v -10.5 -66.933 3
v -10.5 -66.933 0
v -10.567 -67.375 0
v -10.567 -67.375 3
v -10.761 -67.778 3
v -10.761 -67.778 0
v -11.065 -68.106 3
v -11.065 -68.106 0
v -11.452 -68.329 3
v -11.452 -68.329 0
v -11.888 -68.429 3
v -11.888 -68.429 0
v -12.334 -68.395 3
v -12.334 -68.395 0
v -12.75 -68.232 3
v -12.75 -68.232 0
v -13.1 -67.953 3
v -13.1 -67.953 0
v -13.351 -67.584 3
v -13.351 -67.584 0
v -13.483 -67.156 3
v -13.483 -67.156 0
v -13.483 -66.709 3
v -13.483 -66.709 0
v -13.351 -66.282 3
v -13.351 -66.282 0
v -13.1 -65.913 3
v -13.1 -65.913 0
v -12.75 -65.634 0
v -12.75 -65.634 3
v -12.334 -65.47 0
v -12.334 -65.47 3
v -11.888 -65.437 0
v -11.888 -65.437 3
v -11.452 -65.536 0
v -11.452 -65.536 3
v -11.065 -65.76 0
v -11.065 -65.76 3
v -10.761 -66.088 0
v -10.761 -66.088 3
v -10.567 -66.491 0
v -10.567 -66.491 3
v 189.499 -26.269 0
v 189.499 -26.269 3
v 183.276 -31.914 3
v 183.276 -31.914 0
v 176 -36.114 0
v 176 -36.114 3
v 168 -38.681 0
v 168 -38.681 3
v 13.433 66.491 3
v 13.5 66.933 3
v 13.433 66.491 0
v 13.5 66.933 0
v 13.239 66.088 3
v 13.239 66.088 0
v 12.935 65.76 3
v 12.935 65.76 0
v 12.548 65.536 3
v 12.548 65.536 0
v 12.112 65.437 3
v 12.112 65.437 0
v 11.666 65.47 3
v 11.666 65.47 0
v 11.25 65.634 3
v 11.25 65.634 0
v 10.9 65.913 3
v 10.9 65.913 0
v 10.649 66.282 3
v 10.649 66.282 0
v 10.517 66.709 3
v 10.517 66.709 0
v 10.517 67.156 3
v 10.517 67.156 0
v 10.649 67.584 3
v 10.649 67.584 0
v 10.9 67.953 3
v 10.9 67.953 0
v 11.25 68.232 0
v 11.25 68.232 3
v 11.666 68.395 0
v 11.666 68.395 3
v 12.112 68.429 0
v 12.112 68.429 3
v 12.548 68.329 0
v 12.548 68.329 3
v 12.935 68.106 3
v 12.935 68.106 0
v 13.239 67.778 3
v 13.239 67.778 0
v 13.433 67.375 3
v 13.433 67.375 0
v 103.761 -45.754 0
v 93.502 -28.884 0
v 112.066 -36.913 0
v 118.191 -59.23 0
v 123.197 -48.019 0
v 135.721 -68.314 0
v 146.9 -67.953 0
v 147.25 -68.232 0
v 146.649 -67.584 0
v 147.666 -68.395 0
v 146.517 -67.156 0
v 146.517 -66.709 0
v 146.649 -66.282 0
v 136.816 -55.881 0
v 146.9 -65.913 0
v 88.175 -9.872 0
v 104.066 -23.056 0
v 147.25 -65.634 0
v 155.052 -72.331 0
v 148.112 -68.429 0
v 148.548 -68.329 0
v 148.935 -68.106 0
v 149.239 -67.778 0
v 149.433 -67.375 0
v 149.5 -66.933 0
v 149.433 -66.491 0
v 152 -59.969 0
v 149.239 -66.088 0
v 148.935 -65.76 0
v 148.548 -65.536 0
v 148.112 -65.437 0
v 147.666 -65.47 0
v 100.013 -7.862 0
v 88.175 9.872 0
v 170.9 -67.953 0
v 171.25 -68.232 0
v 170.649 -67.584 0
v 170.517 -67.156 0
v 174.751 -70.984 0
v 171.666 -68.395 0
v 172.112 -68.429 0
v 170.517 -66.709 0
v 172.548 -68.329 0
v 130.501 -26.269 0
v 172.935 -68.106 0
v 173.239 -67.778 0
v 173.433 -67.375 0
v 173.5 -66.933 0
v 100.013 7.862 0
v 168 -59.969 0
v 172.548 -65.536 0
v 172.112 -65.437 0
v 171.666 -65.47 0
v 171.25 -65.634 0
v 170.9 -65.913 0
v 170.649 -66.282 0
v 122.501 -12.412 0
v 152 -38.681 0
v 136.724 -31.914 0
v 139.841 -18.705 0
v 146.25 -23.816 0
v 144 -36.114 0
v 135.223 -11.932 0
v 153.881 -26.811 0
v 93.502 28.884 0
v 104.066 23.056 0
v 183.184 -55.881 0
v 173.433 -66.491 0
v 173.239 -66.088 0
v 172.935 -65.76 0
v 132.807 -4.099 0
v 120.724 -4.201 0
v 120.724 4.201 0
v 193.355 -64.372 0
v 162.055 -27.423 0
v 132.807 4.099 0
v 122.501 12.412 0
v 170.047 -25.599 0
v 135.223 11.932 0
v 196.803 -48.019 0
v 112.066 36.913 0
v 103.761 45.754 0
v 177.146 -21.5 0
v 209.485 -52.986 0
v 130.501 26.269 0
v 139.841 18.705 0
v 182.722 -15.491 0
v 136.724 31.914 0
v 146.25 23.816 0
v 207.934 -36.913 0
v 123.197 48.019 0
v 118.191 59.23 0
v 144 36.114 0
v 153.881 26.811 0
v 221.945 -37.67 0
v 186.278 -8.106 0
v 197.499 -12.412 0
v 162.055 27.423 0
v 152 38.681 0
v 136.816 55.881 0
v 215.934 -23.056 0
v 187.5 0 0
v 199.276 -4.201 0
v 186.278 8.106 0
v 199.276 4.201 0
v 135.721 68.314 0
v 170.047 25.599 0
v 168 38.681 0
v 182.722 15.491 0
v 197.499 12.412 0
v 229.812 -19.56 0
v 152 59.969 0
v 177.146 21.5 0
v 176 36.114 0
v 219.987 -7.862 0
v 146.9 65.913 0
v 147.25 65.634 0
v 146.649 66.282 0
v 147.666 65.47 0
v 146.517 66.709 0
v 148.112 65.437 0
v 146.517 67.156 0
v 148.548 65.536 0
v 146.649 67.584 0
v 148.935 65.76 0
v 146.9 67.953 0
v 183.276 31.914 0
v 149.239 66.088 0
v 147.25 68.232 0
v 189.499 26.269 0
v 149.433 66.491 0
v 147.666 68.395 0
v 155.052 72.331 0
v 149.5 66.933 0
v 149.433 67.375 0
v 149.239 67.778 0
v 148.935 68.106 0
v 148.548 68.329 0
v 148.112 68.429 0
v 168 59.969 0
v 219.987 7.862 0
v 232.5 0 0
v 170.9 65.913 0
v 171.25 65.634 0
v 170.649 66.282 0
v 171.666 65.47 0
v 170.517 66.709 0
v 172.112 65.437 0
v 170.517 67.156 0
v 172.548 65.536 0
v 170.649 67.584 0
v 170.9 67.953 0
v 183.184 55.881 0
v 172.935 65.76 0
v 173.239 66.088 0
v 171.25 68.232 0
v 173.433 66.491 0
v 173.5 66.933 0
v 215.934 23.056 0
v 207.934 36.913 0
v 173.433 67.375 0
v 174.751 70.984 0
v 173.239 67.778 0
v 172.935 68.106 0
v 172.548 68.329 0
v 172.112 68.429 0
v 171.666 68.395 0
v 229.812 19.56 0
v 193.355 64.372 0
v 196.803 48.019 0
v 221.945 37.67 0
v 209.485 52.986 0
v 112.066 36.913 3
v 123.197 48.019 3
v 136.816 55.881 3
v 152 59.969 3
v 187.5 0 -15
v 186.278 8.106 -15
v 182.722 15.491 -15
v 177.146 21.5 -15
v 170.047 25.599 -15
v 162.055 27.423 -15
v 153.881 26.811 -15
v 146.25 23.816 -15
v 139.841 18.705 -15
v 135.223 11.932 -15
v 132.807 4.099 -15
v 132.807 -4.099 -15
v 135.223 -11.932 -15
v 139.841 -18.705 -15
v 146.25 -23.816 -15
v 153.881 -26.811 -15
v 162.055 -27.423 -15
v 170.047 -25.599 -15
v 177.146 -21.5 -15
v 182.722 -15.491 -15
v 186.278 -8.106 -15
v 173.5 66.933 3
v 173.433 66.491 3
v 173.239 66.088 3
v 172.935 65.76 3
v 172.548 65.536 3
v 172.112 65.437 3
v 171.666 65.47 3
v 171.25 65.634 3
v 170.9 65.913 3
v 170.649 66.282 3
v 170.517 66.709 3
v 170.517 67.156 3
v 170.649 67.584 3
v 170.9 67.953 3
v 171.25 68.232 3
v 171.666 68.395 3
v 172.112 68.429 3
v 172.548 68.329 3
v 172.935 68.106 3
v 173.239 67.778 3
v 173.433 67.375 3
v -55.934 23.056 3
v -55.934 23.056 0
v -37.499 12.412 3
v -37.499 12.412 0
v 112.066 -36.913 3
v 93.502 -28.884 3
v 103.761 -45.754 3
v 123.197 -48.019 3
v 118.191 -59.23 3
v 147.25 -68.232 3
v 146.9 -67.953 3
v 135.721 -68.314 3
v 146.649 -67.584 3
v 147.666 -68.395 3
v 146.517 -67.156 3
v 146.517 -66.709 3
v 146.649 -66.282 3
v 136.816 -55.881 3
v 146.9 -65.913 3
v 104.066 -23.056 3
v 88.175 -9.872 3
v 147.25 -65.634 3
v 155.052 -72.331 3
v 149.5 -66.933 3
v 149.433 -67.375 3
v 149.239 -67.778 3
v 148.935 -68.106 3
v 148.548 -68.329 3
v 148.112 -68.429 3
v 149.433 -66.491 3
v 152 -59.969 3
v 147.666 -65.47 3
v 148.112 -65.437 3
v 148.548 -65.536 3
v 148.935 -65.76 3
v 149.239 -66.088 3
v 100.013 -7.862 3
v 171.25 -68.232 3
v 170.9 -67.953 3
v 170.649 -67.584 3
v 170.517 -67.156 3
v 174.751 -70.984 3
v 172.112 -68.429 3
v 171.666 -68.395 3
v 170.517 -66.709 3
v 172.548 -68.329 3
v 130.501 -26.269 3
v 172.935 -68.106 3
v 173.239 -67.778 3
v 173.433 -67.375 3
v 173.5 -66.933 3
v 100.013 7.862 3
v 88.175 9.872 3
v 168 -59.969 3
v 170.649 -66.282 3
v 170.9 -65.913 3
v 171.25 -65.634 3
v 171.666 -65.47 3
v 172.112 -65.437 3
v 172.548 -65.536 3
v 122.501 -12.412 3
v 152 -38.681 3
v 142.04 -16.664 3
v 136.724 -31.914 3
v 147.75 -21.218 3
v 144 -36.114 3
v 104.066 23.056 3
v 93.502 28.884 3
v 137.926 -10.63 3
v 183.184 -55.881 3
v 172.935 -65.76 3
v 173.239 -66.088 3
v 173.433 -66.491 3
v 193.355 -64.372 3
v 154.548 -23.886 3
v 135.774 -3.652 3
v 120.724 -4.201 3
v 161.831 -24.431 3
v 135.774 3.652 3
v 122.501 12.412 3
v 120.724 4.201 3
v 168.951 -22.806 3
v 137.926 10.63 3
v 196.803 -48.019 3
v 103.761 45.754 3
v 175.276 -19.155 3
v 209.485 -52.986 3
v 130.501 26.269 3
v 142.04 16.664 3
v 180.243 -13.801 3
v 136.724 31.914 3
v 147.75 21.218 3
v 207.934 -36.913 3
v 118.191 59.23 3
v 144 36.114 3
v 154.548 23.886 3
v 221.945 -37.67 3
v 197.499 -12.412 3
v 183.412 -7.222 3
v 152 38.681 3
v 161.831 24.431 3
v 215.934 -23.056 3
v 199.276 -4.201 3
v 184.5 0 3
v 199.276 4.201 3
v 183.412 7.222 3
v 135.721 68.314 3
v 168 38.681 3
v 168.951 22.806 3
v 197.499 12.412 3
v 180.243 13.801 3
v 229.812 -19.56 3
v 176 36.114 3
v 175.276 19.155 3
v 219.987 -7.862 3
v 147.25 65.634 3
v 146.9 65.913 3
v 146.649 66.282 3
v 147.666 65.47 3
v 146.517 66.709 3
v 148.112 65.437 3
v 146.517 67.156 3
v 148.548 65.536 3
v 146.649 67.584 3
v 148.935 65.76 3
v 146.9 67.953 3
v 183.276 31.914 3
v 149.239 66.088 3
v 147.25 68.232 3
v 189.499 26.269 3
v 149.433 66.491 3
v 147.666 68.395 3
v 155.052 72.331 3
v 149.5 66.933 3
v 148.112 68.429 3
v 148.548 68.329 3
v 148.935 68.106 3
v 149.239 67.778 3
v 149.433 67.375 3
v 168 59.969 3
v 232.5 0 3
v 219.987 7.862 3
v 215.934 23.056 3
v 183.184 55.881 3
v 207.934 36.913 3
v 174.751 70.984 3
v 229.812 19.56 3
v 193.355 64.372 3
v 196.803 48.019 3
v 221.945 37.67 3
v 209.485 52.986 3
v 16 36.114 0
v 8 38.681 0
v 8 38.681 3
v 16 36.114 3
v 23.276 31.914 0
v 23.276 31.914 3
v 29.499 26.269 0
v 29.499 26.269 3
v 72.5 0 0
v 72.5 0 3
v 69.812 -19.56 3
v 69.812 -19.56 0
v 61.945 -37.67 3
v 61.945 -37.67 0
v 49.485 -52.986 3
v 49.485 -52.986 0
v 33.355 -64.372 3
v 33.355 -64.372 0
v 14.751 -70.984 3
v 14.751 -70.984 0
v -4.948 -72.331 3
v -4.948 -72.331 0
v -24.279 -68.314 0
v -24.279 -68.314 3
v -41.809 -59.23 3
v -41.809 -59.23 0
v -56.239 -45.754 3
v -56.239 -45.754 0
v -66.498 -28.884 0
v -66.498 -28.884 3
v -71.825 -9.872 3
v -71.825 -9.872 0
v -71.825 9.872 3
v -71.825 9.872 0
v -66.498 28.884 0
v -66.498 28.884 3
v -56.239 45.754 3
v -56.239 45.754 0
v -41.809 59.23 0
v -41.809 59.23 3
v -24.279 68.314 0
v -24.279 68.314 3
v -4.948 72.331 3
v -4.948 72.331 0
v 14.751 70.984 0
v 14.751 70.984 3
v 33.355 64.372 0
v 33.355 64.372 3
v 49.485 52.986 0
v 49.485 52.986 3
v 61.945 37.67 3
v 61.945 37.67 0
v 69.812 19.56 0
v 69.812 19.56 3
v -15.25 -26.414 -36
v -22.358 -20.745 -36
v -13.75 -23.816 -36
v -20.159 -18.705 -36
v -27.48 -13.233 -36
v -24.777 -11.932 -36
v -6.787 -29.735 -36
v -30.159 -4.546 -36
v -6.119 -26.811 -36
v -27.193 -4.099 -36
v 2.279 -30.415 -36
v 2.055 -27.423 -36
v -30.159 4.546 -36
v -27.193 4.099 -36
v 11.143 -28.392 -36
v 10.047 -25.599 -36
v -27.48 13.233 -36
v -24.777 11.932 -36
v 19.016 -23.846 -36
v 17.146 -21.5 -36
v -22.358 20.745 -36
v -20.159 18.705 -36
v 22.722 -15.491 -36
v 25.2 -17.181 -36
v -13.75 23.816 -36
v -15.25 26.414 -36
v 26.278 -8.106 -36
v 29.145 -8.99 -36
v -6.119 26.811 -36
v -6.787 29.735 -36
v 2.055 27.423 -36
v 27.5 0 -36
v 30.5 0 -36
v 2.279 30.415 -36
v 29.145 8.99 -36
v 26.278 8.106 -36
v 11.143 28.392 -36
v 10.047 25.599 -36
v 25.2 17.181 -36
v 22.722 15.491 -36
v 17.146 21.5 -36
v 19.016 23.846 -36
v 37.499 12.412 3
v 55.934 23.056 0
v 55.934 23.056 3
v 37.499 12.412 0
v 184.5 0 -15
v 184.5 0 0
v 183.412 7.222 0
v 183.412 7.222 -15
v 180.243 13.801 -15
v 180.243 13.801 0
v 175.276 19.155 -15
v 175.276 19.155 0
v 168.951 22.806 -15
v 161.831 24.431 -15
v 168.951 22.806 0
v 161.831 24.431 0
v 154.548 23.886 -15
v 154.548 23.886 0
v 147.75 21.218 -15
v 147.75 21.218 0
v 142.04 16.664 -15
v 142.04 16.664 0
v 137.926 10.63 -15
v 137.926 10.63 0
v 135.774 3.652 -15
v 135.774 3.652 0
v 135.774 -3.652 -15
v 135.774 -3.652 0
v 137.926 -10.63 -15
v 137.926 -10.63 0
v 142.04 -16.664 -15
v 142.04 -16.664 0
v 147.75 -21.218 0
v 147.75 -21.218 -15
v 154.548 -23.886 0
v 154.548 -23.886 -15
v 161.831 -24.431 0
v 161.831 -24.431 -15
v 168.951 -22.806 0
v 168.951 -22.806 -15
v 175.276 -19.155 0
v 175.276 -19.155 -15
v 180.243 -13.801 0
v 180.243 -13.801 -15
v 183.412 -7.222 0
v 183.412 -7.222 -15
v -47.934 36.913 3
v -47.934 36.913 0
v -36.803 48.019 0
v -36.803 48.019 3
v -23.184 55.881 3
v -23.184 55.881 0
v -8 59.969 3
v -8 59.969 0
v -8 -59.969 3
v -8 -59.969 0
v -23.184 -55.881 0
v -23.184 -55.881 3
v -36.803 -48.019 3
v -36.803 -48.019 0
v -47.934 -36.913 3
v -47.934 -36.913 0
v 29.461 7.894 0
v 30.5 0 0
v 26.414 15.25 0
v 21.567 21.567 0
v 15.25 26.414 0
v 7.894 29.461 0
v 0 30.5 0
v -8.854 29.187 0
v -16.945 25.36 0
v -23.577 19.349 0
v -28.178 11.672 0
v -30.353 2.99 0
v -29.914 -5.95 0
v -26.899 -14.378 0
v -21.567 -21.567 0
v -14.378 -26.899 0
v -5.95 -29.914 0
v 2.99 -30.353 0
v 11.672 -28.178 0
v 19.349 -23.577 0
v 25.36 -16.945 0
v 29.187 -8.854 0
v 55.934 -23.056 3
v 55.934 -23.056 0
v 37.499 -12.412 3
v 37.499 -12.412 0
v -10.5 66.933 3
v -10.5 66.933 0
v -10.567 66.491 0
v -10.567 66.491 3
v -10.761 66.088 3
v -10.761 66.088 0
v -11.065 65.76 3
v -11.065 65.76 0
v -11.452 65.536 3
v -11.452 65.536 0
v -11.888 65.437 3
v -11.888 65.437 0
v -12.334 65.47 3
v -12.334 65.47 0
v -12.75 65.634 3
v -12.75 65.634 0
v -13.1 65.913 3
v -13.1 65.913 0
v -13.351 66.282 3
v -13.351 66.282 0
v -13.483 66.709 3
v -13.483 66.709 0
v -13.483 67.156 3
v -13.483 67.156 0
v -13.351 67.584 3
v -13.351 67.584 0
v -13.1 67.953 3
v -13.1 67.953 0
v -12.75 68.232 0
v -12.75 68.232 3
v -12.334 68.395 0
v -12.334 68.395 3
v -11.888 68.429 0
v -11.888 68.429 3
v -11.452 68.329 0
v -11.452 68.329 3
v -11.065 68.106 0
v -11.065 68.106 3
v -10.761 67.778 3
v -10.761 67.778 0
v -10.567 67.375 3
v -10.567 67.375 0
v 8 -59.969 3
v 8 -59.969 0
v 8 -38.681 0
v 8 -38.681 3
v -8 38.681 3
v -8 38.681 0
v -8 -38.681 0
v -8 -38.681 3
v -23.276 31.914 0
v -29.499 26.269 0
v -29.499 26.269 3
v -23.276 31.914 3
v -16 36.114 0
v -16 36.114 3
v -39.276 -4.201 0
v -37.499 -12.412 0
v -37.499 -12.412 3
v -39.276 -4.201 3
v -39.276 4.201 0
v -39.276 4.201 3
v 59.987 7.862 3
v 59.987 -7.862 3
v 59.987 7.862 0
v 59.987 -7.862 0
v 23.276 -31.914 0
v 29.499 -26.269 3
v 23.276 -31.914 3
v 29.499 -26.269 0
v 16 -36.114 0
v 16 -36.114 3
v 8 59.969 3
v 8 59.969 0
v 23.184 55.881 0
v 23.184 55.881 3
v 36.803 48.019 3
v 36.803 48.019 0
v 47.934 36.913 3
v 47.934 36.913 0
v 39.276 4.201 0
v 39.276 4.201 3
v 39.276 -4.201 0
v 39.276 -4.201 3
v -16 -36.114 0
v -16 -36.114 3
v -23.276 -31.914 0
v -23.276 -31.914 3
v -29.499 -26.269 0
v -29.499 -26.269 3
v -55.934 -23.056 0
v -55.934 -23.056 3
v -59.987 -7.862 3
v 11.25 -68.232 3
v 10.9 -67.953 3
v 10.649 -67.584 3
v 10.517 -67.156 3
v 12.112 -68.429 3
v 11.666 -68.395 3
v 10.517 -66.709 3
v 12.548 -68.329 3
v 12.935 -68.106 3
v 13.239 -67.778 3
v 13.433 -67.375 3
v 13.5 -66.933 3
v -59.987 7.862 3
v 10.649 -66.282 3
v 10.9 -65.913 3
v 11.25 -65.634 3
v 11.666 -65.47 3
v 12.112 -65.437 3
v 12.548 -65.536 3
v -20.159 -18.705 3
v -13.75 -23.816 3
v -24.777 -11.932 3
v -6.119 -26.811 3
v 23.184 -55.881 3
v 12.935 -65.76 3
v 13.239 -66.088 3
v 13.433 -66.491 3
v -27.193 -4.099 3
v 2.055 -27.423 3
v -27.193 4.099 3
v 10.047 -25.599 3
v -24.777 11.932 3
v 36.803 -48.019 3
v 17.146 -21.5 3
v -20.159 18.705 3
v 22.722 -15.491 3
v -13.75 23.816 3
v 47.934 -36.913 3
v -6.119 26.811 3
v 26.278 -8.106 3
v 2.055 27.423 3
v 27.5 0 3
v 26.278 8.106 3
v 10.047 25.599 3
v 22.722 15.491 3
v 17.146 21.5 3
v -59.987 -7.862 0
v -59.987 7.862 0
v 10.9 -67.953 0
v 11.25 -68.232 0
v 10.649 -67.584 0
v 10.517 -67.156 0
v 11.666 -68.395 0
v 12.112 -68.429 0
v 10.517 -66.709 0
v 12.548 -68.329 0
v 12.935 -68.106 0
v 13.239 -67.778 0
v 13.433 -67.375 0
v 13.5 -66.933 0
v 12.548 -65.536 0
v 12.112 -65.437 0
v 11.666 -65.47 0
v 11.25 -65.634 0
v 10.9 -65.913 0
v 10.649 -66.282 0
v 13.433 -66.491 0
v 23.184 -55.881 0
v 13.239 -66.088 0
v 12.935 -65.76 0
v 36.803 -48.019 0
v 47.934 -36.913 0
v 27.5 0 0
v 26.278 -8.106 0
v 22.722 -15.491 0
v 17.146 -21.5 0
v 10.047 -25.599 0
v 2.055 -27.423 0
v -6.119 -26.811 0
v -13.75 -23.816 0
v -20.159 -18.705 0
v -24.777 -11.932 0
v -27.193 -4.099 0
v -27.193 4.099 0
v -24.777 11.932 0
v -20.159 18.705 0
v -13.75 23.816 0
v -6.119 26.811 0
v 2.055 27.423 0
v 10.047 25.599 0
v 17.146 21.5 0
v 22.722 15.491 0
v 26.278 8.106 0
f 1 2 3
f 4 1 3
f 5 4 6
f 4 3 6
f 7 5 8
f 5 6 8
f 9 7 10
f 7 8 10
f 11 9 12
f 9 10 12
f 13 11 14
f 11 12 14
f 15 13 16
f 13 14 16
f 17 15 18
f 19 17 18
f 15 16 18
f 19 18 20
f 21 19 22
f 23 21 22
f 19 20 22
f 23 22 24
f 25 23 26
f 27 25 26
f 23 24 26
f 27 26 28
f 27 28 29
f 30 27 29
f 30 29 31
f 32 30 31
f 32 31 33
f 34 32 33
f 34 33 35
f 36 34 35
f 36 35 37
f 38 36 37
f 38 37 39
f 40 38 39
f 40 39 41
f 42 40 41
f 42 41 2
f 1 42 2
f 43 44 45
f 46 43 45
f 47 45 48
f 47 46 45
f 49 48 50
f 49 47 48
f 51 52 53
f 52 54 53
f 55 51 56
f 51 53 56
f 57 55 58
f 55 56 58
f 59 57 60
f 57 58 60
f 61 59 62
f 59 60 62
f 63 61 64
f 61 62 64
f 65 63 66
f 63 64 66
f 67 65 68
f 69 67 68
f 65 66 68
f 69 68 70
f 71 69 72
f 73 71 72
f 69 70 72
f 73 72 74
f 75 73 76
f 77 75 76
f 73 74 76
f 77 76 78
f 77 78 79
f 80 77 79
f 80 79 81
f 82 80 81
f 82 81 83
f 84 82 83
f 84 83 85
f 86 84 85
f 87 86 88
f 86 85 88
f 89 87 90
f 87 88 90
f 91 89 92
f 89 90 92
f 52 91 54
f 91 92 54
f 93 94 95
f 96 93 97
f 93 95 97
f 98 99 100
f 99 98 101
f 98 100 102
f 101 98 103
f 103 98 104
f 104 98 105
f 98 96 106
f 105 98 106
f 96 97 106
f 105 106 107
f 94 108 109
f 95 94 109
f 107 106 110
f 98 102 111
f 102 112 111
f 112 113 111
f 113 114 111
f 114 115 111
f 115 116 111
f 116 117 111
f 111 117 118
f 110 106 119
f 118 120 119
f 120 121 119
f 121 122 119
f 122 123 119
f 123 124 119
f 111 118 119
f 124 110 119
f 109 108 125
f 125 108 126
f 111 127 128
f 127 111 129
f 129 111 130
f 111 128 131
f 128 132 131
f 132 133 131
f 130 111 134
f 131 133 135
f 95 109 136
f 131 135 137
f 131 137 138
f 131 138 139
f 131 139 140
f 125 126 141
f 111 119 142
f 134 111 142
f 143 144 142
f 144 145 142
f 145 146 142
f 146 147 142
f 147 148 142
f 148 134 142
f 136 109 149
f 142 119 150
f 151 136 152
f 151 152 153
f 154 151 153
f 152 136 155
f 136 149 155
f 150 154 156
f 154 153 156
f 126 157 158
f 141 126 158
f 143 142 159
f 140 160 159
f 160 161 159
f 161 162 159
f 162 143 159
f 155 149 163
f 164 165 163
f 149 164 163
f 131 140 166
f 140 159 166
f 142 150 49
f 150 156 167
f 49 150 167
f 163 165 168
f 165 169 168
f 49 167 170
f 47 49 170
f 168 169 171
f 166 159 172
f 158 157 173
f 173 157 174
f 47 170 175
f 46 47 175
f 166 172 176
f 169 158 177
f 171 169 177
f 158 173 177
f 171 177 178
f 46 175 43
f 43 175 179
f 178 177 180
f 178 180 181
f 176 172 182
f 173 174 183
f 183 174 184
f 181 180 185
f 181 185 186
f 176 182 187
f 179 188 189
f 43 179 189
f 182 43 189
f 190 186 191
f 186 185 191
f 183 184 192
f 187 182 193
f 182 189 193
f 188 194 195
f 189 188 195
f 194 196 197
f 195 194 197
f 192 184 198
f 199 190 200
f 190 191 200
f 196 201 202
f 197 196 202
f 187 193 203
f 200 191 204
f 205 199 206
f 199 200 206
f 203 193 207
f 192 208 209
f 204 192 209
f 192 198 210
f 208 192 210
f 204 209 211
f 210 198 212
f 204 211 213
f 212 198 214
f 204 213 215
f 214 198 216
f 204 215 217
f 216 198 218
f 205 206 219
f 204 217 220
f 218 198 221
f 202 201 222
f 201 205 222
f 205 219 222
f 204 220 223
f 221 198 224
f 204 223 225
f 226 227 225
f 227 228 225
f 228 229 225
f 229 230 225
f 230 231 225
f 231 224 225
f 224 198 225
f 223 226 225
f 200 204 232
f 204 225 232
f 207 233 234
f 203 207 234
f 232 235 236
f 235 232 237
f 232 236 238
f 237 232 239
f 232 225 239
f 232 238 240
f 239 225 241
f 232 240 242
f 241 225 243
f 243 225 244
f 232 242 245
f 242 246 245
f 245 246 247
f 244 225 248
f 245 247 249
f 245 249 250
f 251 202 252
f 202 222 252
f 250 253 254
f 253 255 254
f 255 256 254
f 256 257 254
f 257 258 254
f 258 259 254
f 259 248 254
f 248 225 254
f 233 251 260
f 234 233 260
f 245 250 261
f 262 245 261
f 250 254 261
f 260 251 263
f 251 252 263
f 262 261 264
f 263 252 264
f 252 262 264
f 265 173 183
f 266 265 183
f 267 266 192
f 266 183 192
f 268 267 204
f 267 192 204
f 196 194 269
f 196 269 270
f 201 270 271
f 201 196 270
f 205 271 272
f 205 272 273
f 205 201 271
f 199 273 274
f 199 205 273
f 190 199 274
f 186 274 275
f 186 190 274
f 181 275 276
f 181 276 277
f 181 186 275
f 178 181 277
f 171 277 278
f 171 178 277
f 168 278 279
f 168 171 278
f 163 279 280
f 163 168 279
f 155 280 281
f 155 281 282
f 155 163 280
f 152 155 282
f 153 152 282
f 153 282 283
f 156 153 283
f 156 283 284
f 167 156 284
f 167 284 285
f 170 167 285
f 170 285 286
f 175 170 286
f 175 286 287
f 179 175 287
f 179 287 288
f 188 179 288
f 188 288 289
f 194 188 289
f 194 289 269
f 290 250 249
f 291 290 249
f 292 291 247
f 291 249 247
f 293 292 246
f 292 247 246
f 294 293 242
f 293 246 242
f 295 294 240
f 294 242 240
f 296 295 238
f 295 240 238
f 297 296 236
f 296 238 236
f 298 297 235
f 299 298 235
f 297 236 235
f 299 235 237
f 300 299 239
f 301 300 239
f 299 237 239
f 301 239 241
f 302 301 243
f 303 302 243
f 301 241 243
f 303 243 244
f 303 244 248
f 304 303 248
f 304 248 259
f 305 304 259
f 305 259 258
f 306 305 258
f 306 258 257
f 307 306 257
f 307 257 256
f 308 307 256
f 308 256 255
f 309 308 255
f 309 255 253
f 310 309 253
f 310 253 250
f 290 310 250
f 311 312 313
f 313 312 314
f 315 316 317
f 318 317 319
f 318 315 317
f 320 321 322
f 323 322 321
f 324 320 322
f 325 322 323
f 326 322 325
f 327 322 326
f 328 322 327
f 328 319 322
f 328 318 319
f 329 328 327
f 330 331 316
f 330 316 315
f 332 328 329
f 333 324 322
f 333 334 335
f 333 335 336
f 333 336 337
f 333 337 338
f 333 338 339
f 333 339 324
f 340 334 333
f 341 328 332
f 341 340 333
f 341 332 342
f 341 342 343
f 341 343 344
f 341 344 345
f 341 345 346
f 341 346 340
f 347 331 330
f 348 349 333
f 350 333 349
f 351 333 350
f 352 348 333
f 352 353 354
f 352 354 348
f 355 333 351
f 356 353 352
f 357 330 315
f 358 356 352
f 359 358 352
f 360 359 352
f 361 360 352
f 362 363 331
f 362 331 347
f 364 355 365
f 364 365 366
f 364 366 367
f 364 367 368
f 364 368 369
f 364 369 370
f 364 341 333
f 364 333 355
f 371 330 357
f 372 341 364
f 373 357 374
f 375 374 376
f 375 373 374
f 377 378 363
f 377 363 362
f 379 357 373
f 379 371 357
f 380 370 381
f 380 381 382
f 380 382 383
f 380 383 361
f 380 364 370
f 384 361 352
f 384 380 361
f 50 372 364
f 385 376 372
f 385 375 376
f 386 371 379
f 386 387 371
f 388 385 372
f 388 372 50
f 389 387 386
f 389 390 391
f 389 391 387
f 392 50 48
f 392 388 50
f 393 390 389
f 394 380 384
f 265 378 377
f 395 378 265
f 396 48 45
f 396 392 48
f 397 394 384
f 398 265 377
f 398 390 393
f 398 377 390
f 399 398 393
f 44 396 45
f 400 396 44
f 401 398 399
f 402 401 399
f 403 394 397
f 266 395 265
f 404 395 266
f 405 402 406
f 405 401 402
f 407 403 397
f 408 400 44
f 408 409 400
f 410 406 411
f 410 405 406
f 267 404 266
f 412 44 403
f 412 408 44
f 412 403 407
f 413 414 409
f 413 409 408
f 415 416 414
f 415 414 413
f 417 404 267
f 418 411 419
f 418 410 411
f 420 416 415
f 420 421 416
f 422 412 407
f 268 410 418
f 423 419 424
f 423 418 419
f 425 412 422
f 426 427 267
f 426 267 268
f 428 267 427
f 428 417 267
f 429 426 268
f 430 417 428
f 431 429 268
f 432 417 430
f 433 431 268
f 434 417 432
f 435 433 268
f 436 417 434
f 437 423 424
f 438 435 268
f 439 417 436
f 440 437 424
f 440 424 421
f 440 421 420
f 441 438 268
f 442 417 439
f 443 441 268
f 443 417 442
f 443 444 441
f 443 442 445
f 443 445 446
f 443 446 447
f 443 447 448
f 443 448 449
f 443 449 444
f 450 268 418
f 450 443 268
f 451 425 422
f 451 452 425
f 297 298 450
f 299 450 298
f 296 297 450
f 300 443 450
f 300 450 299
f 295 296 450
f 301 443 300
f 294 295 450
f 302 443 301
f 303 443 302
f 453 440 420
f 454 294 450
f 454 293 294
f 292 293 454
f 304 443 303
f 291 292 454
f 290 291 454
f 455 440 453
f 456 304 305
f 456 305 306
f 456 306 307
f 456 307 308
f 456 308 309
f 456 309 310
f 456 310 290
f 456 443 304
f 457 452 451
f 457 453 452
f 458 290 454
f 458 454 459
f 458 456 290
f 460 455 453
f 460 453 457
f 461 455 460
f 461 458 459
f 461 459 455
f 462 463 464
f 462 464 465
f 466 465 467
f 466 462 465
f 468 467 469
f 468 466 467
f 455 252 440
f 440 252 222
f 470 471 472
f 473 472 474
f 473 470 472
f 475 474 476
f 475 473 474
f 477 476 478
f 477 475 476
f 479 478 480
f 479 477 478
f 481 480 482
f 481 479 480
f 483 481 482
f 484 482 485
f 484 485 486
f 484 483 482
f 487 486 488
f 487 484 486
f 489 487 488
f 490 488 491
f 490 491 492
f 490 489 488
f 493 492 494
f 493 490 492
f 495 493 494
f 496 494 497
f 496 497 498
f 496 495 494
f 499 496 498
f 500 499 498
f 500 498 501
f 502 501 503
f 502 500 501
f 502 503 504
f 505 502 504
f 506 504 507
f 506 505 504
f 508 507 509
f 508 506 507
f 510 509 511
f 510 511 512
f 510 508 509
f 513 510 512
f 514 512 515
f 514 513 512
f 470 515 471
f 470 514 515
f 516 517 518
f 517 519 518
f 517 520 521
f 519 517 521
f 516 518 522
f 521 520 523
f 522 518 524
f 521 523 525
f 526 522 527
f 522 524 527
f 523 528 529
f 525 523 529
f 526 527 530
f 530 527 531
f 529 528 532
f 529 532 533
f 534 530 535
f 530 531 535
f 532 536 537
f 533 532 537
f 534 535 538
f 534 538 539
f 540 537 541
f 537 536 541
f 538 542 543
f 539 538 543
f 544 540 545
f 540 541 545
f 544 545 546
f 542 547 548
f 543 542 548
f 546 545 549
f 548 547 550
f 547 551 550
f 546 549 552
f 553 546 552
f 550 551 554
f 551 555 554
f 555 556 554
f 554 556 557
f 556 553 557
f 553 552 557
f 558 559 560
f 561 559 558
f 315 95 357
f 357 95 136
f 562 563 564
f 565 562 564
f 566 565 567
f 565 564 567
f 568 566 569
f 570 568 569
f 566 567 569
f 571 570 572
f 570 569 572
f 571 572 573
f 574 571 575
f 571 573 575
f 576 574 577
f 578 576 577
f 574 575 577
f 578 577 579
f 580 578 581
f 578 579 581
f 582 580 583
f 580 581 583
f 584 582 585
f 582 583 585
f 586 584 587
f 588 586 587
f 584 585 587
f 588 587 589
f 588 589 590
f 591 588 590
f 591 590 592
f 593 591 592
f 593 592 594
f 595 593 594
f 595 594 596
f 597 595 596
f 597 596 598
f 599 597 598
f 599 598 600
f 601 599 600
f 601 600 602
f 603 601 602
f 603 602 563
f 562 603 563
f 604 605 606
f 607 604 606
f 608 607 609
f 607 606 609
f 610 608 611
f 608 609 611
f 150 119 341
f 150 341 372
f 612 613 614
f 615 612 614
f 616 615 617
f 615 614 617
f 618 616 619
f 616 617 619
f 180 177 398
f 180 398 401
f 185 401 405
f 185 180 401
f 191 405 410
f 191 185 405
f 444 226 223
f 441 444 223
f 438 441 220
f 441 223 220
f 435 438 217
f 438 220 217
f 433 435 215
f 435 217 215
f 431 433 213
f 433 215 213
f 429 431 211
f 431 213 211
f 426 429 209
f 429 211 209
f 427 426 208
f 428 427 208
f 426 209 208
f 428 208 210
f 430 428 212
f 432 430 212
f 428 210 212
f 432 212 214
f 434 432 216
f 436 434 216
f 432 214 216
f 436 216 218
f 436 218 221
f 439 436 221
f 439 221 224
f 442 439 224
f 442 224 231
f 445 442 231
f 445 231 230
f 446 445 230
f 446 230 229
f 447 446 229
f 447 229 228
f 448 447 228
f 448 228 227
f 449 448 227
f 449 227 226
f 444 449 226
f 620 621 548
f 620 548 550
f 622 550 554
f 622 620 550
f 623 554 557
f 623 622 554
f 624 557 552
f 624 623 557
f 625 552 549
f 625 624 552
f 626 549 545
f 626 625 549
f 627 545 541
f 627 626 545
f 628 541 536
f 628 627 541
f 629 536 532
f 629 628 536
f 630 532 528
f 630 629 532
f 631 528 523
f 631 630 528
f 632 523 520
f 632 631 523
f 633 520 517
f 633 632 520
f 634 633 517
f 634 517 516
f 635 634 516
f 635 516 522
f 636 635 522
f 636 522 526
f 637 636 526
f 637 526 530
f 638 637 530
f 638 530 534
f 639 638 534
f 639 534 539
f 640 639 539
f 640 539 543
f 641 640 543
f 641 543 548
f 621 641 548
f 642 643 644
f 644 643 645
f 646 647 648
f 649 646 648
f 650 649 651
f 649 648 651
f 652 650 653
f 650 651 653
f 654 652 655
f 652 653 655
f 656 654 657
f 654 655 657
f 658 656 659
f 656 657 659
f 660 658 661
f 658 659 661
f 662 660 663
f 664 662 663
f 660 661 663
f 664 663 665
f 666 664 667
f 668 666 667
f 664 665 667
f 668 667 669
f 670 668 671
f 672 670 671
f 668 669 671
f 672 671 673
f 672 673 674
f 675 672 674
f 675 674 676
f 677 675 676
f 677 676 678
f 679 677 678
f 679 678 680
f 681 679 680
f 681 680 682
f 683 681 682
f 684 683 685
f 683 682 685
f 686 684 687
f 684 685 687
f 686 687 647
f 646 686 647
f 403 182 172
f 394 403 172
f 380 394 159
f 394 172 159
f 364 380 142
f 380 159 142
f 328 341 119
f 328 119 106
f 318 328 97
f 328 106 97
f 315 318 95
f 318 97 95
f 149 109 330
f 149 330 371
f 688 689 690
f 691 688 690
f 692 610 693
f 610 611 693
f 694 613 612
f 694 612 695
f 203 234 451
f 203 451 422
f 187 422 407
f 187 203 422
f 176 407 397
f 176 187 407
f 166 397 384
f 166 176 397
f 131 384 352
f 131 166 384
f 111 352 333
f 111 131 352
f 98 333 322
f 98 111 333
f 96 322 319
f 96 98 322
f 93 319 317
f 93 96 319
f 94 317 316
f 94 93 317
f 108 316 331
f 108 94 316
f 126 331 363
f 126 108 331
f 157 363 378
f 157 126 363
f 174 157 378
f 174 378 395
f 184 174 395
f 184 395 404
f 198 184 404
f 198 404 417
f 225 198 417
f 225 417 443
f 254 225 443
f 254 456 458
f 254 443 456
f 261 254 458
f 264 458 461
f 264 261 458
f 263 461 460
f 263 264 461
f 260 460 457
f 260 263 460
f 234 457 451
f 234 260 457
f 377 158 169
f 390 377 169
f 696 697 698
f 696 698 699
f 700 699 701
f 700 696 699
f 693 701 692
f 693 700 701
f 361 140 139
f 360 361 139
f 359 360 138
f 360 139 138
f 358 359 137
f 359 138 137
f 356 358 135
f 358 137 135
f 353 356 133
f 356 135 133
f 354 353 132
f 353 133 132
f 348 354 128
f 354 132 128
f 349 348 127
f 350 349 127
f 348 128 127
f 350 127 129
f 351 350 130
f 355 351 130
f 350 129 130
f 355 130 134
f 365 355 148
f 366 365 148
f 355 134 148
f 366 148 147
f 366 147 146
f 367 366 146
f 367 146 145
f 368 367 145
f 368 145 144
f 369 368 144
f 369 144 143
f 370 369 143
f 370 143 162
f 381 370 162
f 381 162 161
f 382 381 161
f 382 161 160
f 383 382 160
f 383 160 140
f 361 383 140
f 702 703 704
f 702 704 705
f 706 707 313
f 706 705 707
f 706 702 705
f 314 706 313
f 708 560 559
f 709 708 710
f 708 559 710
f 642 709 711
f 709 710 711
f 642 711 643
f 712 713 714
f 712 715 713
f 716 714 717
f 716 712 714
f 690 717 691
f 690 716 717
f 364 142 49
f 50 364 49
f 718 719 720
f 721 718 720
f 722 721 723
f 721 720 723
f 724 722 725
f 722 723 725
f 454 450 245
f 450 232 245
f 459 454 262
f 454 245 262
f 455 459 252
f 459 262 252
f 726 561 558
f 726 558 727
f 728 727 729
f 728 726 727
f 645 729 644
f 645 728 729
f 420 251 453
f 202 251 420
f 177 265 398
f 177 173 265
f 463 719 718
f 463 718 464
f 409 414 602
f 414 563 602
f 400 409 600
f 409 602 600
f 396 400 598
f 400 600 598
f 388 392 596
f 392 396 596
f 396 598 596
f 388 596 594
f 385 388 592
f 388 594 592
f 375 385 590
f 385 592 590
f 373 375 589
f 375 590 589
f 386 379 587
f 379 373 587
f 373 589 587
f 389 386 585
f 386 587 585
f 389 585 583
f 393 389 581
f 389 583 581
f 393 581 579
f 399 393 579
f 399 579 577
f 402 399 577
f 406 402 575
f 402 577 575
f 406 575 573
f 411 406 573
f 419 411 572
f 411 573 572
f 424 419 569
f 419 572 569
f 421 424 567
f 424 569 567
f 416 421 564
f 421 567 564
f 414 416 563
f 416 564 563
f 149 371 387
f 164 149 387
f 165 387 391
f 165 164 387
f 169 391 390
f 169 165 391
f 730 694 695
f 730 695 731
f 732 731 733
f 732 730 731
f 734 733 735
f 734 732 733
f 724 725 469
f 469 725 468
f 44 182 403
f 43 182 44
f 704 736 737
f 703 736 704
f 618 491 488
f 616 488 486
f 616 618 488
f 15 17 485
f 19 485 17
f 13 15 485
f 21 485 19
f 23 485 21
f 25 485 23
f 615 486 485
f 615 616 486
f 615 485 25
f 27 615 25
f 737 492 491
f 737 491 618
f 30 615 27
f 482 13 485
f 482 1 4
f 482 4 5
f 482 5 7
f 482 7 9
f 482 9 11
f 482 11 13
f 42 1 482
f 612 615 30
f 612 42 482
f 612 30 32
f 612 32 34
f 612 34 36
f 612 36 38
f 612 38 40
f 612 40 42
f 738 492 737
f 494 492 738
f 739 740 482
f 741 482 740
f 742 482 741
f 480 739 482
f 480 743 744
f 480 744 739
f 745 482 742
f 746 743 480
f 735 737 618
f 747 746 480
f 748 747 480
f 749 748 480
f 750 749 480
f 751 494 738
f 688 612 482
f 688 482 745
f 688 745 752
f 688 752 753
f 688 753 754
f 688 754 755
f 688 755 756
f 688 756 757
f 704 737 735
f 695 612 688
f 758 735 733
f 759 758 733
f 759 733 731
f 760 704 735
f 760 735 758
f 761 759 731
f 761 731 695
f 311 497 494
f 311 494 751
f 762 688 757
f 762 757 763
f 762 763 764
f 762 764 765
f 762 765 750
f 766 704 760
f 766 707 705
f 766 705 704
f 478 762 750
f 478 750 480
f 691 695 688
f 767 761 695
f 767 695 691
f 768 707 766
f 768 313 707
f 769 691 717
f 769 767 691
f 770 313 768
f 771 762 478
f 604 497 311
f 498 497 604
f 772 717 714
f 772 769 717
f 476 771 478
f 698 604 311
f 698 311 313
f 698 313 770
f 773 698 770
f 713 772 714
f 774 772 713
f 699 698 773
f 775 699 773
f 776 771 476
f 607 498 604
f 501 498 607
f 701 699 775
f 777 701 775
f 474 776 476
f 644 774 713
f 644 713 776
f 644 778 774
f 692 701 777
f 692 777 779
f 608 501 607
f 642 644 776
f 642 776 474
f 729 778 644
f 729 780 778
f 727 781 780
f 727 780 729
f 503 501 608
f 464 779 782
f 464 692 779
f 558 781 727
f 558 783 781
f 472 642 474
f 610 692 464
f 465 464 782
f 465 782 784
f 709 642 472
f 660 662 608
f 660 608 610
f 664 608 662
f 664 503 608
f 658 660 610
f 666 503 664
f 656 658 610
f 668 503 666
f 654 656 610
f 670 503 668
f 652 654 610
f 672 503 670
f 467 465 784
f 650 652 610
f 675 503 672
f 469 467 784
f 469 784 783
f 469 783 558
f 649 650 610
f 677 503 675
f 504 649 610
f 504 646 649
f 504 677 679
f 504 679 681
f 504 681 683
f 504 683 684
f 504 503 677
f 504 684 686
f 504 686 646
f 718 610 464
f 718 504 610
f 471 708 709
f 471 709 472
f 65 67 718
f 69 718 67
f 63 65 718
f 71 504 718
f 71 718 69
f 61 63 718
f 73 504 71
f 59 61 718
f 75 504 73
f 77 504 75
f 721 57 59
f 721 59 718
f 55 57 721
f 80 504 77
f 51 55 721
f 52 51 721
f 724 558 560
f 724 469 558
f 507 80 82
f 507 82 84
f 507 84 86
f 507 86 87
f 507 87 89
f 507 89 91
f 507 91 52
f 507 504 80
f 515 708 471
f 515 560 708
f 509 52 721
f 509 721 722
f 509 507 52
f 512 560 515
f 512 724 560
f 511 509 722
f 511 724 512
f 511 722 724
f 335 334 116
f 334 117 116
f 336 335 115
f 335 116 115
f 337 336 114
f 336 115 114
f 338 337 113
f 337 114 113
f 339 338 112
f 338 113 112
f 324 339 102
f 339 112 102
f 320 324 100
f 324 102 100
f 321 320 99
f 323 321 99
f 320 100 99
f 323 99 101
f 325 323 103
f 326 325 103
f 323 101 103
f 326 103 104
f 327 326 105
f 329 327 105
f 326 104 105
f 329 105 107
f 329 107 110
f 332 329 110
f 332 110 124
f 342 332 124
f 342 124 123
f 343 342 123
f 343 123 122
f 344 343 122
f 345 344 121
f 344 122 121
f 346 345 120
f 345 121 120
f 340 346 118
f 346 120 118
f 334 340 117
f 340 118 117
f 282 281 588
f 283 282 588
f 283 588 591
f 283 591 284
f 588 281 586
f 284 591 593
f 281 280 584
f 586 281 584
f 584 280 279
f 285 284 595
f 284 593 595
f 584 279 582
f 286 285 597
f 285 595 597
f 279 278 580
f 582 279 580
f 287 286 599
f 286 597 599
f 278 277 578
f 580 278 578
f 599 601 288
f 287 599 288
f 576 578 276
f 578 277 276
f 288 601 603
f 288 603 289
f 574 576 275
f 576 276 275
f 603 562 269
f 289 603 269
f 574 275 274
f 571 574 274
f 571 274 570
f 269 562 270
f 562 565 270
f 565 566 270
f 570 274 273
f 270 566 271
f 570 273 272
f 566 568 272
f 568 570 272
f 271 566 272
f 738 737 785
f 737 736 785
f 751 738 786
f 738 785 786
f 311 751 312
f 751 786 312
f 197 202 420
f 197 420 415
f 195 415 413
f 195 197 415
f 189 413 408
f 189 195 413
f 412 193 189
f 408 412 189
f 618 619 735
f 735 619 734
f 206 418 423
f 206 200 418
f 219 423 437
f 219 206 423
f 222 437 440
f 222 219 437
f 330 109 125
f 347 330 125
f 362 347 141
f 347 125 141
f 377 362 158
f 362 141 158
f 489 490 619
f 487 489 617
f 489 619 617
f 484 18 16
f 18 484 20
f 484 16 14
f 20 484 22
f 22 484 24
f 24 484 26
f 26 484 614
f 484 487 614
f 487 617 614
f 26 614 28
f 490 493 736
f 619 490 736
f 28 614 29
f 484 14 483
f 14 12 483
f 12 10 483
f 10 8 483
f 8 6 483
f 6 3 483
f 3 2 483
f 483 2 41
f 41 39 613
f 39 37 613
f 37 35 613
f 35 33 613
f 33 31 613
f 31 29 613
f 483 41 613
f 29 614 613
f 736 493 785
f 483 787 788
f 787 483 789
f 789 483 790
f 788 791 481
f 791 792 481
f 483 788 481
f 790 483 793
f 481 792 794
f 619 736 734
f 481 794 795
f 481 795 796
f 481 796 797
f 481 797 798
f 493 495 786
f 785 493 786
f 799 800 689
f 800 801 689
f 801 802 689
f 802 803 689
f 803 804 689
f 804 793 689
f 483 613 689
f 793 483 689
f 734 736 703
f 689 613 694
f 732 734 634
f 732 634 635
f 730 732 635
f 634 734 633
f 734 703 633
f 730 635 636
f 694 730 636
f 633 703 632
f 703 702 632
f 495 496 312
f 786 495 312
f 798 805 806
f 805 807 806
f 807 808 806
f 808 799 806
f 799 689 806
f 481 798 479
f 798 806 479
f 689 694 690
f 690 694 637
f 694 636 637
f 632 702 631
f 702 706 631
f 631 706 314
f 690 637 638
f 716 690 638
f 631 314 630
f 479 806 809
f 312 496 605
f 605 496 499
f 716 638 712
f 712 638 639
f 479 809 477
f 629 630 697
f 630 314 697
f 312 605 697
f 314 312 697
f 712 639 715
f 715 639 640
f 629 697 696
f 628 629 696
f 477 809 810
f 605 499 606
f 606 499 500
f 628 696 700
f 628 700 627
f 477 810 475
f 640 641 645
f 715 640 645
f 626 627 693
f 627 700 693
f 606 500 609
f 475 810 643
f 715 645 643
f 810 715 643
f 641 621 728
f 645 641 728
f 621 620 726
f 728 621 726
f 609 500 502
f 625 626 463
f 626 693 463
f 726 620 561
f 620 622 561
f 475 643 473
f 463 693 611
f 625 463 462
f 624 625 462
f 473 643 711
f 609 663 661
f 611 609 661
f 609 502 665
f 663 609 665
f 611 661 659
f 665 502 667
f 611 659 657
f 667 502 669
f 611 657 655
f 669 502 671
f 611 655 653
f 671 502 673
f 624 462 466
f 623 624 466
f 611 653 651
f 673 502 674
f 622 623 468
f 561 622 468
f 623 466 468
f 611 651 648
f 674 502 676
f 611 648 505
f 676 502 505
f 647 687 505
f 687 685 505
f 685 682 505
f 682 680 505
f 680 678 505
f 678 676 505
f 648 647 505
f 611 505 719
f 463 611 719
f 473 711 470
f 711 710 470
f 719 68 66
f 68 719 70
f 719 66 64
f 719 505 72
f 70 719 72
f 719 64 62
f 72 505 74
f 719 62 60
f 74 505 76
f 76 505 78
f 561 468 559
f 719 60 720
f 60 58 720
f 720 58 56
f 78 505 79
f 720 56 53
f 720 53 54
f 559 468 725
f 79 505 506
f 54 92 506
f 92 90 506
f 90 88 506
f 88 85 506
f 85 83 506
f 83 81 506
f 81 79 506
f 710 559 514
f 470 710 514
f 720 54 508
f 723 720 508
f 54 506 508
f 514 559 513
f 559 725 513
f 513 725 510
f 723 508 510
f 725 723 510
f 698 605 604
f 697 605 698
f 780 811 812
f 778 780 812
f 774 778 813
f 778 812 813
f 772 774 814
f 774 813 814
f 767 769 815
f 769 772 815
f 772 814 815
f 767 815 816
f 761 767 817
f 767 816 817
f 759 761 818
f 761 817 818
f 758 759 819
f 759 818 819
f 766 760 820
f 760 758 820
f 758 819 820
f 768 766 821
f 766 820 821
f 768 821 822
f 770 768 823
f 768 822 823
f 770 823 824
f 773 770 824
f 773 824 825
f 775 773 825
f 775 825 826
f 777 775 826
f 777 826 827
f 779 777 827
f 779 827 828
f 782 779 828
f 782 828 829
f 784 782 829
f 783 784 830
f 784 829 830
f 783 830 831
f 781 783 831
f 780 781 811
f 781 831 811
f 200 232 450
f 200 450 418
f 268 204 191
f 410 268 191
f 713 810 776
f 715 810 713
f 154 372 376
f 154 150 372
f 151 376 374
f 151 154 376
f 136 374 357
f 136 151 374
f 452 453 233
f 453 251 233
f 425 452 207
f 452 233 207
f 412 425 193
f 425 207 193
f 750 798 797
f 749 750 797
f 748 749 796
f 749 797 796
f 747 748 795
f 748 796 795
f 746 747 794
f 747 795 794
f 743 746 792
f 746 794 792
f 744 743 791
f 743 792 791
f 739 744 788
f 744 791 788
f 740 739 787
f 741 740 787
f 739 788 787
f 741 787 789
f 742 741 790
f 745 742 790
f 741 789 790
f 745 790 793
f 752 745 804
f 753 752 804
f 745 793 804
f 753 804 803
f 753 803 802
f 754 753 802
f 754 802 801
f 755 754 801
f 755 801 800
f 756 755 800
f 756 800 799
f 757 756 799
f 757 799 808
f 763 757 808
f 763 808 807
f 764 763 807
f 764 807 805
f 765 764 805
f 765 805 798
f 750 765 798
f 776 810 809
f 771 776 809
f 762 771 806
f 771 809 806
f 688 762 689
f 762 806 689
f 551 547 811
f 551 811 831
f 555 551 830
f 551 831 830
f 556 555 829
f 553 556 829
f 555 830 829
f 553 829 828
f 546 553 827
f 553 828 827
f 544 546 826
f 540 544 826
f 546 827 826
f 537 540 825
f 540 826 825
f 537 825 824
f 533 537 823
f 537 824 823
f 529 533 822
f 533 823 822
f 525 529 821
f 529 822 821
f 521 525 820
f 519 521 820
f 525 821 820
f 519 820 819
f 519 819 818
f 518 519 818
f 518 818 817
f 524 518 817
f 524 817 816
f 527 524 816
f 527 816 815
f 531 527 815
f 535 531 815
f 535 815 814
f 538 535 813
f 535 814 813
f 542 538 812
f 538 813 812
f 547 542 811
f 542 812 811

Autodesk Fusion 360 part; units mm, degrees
sketch "Sketch1" plane through (0, 0, 0) normal (0, 0, 1) x (1, 0, 0)
  circle A0 centre (0, 0) radius 72.5
  circle A1 centre (0, 0) radius 27.5
  circle A2 centre (0, 0) radius 30.5
  circle A3 centre (0, 0) radius 60.5
  circle A4 centre (0, 0) radius 39.5
  line L0 (0, 74) -> (0, 30.5)
  line L1 (8, 72.0573) -> (8, 38.6814)
  line L2 (-8, 72.0573) -> (-8, 38.6814)
  line L3 (-66.4034, 29.1004) -> (-37.4991, 12.4125)
  line L4 (-58.4034, 42.9568) -> (-29.4991, 26.2689)
  line L5 (-58.4034, -42.9568) -> (-29.4991, -26.2689)
  line L6 (-66.4034, -29.1004) -> (-37.4991, -12.4125)
  line L7 (8, -72.0573) -> (8, -38.6814)
  line L8 (-8, -72.0573) -> (-8, -38.6814)
  line L9 (66.4034, -29.1004) -> (37.4991, -12.4125)
  line L10 (58.4034, -42.9568) -> (29.4991, -26.2689)
  line L11 (58.4034, 42.9568) -> (29.4991, 26.2689)
  line L12 (66.4034, 29.1004) -> (37.4991, 12.4125)
  circle A5 centre (0, 0) radius 68
  circle A6 centre (-12, 66.9328) radius 1.5
  circle A7 centre (12, 66.9328) radius 1.5
  circle A8 centre (12, -66.9328) radius 1.5
  circle A9 centre (-12, -66.9328) radius 1.5
  dimension "d1" = 145
  dimension "d2" = 55
  dimension "d3" = 61
  dimension "d4" = 121
  dimension "d5" = 79
  dimension "d6" = 8
  dimension "d7" = 8
  dimension "d9" = 360
  dimension "d10" = 136
  dimension "d11" = 3
  dimension "d12" = 3
  dimension "d13" = 4
  dimension "d14" = 4
  dimension "d16" = 360
extrude "Extrude1" add sketch "Sketch1" along normal blind 3 contours A0 L9 L12 A5 | A0 L11 L12 A5 | A0 L9 L10 A5 | A0 L1 L11 A5 A7 | A3 L9 L12 A5 | A3 L11 L12 A5 | A0 L7 L10 A5 A8 | A3 L9 L10 A5 | A0 L0 L1 A5 | A3 L1 L11 A5 A7 | A3 A4 L11 L12 | A0 L7 L8 A5 | A3 L7 L10 A5 A8 | A3 A4 L9 L10 | A0 L0 L2 A5 | A3 L0 L1 A5 | A2 | A4 | A0 L5 L8 A5 A9 | A3 L7 L8 A5 | A0 L2 L4 A5 A6 | A3 L0 L2 A5 | A3 A4 L0 L1 | A0 L5 L6 A5 | A3 L5 L8 A5 A9 | A3 A4 L7 L8 | A0 L3 L4 A5 | A3 L2 L4 A5 A6 | A3 A4 L0 L2 | A0 L3 L6 A5 | A3 L5 L6 A5 | A3 L3 L4 A5 | A3 L3 L6 A5 | A3 A4 L5 L6 | A3 A4 L3 L4 makes body 1
extrude "Extrude2" add sketch "Sketch1" against normal blind 36 contours A2 bodies 1
sketch "Sketch2" plane through (0, 0, 0) normal (0, 0, 1) x (1, 0, 0)
  circle A0 centre (160, 0) radius 68
  circle A1 centre (160, 0) radius 72.5
  circle A2 centre (148, -66.9328) radius 1.5
  line L0 (168, -72.0573) -> (168, -38.6814)
  line L1 (226.4034, -29.1004) -> (197.4991, -12.4125)
  line L2 (168, 72.0573) -> (168, 38.6814)
  line L3 (101.5966, 42.9568) -> (130.5009, 26.2689)
  line L4 (101.5966, -42.9568) -> (130.5009, -26.2689)
  circle A3 centre (172, -66.9328) radius 1.5
  line L5 (93.5966, 29.1004) -> (122.5009, 12.4125)
  circle A4 centre (148, 66.9328) radius 1.5
  line L6 (218.4034, 42.9568) -> (189.4991, 26.2689)
  line L7 (93.5966, -29.1004) -> (122.5009, -12.4125)
  circle A5 centre (160, 0) radius 39.5
  line L8 (218.4034, -42.9568) -> (189.4991, -26.2689)
  circle A6 centre (172, 66.9328) radius 1.5
  circle A7 centre (160, 0) radius 30.5
  line L9 (152, -72.0573) -> (152, -38.6814)
  circle A8 centre (160, 0) radius 60.5
  line L10 (152, 72.0573) -> (152, 38.6814)
  circle A9 centre (160, 0) radius 27.5
  line L11 (226.4034, 29.1004) -> (197.4991, 12.4125)
  line L12 (160, 74) -> (160, 30.5)
  circle A10 centre (160, 0) radius 24.5
  point P0 (160, 0)
  dimension "d23" = 360
  dimension "d25" = 360
  dimension "d26" = 145
  dimension "d27" = 55
  dimension "d28" = 61
  dimension "d29" = 121
  dimension "d30" = 79
  dimension "d31" = 8
  dimension "d32" = 8
  dimension "d33" = 136
  dimension "d34" = 3
  dimension "d35" = 3
  dimension "d36" = 4
  dimension "d37" = 4
  dimension "d38" = 49
extrude "Extrude3" add sketch "Sketch2" along normal blind 3 separate body contours A0 L1 A8 L11 | A0 A1 L1 L11 | A0 L6 A8 L11 | A0 A1 L6 L11 | A0 A1 L1 L8 | A0 L1 L8 A8 | A0 L2 L6 A6 A8 | A0 A1 L2 L6 A6 | L6 A5 A8 L11 | A0 A1 L0 A3 L8 | A0 L0 A3 L8 A8 | L1 A5 L8 A8 | A7 | A5 | A0 A1 L2 L12 | A0 L2 A8 L12 | L2 A5 A8 L12 | A0 A1 L0 L9 | L0 A5 L9 A8 | A0 L0 L9 A8 | A0 A1 L10 L12 | A5 A8 L10 L12 | A0 A8 L10 L12 | A0 A1 A2 L4 L9 | A0 A2 L4 L9 A8 | A0 A1 L3 A4 L10 | A0 L3 A4 A8 L10 | A0 A1 L4 L7 | L4 L7 A5 A8 | A0 L4 L7 A8 | A0 A1 L3 L5 | A0 L3 L5 A8 | L3 L5 A5 A8 | A0 A1 L5 L7 | A0 L5 L7 A8 | A9 makes body 2
extrude "Extrude4" add sketch "Sketch2" against normal blind 15 contours A9 bodies 2
